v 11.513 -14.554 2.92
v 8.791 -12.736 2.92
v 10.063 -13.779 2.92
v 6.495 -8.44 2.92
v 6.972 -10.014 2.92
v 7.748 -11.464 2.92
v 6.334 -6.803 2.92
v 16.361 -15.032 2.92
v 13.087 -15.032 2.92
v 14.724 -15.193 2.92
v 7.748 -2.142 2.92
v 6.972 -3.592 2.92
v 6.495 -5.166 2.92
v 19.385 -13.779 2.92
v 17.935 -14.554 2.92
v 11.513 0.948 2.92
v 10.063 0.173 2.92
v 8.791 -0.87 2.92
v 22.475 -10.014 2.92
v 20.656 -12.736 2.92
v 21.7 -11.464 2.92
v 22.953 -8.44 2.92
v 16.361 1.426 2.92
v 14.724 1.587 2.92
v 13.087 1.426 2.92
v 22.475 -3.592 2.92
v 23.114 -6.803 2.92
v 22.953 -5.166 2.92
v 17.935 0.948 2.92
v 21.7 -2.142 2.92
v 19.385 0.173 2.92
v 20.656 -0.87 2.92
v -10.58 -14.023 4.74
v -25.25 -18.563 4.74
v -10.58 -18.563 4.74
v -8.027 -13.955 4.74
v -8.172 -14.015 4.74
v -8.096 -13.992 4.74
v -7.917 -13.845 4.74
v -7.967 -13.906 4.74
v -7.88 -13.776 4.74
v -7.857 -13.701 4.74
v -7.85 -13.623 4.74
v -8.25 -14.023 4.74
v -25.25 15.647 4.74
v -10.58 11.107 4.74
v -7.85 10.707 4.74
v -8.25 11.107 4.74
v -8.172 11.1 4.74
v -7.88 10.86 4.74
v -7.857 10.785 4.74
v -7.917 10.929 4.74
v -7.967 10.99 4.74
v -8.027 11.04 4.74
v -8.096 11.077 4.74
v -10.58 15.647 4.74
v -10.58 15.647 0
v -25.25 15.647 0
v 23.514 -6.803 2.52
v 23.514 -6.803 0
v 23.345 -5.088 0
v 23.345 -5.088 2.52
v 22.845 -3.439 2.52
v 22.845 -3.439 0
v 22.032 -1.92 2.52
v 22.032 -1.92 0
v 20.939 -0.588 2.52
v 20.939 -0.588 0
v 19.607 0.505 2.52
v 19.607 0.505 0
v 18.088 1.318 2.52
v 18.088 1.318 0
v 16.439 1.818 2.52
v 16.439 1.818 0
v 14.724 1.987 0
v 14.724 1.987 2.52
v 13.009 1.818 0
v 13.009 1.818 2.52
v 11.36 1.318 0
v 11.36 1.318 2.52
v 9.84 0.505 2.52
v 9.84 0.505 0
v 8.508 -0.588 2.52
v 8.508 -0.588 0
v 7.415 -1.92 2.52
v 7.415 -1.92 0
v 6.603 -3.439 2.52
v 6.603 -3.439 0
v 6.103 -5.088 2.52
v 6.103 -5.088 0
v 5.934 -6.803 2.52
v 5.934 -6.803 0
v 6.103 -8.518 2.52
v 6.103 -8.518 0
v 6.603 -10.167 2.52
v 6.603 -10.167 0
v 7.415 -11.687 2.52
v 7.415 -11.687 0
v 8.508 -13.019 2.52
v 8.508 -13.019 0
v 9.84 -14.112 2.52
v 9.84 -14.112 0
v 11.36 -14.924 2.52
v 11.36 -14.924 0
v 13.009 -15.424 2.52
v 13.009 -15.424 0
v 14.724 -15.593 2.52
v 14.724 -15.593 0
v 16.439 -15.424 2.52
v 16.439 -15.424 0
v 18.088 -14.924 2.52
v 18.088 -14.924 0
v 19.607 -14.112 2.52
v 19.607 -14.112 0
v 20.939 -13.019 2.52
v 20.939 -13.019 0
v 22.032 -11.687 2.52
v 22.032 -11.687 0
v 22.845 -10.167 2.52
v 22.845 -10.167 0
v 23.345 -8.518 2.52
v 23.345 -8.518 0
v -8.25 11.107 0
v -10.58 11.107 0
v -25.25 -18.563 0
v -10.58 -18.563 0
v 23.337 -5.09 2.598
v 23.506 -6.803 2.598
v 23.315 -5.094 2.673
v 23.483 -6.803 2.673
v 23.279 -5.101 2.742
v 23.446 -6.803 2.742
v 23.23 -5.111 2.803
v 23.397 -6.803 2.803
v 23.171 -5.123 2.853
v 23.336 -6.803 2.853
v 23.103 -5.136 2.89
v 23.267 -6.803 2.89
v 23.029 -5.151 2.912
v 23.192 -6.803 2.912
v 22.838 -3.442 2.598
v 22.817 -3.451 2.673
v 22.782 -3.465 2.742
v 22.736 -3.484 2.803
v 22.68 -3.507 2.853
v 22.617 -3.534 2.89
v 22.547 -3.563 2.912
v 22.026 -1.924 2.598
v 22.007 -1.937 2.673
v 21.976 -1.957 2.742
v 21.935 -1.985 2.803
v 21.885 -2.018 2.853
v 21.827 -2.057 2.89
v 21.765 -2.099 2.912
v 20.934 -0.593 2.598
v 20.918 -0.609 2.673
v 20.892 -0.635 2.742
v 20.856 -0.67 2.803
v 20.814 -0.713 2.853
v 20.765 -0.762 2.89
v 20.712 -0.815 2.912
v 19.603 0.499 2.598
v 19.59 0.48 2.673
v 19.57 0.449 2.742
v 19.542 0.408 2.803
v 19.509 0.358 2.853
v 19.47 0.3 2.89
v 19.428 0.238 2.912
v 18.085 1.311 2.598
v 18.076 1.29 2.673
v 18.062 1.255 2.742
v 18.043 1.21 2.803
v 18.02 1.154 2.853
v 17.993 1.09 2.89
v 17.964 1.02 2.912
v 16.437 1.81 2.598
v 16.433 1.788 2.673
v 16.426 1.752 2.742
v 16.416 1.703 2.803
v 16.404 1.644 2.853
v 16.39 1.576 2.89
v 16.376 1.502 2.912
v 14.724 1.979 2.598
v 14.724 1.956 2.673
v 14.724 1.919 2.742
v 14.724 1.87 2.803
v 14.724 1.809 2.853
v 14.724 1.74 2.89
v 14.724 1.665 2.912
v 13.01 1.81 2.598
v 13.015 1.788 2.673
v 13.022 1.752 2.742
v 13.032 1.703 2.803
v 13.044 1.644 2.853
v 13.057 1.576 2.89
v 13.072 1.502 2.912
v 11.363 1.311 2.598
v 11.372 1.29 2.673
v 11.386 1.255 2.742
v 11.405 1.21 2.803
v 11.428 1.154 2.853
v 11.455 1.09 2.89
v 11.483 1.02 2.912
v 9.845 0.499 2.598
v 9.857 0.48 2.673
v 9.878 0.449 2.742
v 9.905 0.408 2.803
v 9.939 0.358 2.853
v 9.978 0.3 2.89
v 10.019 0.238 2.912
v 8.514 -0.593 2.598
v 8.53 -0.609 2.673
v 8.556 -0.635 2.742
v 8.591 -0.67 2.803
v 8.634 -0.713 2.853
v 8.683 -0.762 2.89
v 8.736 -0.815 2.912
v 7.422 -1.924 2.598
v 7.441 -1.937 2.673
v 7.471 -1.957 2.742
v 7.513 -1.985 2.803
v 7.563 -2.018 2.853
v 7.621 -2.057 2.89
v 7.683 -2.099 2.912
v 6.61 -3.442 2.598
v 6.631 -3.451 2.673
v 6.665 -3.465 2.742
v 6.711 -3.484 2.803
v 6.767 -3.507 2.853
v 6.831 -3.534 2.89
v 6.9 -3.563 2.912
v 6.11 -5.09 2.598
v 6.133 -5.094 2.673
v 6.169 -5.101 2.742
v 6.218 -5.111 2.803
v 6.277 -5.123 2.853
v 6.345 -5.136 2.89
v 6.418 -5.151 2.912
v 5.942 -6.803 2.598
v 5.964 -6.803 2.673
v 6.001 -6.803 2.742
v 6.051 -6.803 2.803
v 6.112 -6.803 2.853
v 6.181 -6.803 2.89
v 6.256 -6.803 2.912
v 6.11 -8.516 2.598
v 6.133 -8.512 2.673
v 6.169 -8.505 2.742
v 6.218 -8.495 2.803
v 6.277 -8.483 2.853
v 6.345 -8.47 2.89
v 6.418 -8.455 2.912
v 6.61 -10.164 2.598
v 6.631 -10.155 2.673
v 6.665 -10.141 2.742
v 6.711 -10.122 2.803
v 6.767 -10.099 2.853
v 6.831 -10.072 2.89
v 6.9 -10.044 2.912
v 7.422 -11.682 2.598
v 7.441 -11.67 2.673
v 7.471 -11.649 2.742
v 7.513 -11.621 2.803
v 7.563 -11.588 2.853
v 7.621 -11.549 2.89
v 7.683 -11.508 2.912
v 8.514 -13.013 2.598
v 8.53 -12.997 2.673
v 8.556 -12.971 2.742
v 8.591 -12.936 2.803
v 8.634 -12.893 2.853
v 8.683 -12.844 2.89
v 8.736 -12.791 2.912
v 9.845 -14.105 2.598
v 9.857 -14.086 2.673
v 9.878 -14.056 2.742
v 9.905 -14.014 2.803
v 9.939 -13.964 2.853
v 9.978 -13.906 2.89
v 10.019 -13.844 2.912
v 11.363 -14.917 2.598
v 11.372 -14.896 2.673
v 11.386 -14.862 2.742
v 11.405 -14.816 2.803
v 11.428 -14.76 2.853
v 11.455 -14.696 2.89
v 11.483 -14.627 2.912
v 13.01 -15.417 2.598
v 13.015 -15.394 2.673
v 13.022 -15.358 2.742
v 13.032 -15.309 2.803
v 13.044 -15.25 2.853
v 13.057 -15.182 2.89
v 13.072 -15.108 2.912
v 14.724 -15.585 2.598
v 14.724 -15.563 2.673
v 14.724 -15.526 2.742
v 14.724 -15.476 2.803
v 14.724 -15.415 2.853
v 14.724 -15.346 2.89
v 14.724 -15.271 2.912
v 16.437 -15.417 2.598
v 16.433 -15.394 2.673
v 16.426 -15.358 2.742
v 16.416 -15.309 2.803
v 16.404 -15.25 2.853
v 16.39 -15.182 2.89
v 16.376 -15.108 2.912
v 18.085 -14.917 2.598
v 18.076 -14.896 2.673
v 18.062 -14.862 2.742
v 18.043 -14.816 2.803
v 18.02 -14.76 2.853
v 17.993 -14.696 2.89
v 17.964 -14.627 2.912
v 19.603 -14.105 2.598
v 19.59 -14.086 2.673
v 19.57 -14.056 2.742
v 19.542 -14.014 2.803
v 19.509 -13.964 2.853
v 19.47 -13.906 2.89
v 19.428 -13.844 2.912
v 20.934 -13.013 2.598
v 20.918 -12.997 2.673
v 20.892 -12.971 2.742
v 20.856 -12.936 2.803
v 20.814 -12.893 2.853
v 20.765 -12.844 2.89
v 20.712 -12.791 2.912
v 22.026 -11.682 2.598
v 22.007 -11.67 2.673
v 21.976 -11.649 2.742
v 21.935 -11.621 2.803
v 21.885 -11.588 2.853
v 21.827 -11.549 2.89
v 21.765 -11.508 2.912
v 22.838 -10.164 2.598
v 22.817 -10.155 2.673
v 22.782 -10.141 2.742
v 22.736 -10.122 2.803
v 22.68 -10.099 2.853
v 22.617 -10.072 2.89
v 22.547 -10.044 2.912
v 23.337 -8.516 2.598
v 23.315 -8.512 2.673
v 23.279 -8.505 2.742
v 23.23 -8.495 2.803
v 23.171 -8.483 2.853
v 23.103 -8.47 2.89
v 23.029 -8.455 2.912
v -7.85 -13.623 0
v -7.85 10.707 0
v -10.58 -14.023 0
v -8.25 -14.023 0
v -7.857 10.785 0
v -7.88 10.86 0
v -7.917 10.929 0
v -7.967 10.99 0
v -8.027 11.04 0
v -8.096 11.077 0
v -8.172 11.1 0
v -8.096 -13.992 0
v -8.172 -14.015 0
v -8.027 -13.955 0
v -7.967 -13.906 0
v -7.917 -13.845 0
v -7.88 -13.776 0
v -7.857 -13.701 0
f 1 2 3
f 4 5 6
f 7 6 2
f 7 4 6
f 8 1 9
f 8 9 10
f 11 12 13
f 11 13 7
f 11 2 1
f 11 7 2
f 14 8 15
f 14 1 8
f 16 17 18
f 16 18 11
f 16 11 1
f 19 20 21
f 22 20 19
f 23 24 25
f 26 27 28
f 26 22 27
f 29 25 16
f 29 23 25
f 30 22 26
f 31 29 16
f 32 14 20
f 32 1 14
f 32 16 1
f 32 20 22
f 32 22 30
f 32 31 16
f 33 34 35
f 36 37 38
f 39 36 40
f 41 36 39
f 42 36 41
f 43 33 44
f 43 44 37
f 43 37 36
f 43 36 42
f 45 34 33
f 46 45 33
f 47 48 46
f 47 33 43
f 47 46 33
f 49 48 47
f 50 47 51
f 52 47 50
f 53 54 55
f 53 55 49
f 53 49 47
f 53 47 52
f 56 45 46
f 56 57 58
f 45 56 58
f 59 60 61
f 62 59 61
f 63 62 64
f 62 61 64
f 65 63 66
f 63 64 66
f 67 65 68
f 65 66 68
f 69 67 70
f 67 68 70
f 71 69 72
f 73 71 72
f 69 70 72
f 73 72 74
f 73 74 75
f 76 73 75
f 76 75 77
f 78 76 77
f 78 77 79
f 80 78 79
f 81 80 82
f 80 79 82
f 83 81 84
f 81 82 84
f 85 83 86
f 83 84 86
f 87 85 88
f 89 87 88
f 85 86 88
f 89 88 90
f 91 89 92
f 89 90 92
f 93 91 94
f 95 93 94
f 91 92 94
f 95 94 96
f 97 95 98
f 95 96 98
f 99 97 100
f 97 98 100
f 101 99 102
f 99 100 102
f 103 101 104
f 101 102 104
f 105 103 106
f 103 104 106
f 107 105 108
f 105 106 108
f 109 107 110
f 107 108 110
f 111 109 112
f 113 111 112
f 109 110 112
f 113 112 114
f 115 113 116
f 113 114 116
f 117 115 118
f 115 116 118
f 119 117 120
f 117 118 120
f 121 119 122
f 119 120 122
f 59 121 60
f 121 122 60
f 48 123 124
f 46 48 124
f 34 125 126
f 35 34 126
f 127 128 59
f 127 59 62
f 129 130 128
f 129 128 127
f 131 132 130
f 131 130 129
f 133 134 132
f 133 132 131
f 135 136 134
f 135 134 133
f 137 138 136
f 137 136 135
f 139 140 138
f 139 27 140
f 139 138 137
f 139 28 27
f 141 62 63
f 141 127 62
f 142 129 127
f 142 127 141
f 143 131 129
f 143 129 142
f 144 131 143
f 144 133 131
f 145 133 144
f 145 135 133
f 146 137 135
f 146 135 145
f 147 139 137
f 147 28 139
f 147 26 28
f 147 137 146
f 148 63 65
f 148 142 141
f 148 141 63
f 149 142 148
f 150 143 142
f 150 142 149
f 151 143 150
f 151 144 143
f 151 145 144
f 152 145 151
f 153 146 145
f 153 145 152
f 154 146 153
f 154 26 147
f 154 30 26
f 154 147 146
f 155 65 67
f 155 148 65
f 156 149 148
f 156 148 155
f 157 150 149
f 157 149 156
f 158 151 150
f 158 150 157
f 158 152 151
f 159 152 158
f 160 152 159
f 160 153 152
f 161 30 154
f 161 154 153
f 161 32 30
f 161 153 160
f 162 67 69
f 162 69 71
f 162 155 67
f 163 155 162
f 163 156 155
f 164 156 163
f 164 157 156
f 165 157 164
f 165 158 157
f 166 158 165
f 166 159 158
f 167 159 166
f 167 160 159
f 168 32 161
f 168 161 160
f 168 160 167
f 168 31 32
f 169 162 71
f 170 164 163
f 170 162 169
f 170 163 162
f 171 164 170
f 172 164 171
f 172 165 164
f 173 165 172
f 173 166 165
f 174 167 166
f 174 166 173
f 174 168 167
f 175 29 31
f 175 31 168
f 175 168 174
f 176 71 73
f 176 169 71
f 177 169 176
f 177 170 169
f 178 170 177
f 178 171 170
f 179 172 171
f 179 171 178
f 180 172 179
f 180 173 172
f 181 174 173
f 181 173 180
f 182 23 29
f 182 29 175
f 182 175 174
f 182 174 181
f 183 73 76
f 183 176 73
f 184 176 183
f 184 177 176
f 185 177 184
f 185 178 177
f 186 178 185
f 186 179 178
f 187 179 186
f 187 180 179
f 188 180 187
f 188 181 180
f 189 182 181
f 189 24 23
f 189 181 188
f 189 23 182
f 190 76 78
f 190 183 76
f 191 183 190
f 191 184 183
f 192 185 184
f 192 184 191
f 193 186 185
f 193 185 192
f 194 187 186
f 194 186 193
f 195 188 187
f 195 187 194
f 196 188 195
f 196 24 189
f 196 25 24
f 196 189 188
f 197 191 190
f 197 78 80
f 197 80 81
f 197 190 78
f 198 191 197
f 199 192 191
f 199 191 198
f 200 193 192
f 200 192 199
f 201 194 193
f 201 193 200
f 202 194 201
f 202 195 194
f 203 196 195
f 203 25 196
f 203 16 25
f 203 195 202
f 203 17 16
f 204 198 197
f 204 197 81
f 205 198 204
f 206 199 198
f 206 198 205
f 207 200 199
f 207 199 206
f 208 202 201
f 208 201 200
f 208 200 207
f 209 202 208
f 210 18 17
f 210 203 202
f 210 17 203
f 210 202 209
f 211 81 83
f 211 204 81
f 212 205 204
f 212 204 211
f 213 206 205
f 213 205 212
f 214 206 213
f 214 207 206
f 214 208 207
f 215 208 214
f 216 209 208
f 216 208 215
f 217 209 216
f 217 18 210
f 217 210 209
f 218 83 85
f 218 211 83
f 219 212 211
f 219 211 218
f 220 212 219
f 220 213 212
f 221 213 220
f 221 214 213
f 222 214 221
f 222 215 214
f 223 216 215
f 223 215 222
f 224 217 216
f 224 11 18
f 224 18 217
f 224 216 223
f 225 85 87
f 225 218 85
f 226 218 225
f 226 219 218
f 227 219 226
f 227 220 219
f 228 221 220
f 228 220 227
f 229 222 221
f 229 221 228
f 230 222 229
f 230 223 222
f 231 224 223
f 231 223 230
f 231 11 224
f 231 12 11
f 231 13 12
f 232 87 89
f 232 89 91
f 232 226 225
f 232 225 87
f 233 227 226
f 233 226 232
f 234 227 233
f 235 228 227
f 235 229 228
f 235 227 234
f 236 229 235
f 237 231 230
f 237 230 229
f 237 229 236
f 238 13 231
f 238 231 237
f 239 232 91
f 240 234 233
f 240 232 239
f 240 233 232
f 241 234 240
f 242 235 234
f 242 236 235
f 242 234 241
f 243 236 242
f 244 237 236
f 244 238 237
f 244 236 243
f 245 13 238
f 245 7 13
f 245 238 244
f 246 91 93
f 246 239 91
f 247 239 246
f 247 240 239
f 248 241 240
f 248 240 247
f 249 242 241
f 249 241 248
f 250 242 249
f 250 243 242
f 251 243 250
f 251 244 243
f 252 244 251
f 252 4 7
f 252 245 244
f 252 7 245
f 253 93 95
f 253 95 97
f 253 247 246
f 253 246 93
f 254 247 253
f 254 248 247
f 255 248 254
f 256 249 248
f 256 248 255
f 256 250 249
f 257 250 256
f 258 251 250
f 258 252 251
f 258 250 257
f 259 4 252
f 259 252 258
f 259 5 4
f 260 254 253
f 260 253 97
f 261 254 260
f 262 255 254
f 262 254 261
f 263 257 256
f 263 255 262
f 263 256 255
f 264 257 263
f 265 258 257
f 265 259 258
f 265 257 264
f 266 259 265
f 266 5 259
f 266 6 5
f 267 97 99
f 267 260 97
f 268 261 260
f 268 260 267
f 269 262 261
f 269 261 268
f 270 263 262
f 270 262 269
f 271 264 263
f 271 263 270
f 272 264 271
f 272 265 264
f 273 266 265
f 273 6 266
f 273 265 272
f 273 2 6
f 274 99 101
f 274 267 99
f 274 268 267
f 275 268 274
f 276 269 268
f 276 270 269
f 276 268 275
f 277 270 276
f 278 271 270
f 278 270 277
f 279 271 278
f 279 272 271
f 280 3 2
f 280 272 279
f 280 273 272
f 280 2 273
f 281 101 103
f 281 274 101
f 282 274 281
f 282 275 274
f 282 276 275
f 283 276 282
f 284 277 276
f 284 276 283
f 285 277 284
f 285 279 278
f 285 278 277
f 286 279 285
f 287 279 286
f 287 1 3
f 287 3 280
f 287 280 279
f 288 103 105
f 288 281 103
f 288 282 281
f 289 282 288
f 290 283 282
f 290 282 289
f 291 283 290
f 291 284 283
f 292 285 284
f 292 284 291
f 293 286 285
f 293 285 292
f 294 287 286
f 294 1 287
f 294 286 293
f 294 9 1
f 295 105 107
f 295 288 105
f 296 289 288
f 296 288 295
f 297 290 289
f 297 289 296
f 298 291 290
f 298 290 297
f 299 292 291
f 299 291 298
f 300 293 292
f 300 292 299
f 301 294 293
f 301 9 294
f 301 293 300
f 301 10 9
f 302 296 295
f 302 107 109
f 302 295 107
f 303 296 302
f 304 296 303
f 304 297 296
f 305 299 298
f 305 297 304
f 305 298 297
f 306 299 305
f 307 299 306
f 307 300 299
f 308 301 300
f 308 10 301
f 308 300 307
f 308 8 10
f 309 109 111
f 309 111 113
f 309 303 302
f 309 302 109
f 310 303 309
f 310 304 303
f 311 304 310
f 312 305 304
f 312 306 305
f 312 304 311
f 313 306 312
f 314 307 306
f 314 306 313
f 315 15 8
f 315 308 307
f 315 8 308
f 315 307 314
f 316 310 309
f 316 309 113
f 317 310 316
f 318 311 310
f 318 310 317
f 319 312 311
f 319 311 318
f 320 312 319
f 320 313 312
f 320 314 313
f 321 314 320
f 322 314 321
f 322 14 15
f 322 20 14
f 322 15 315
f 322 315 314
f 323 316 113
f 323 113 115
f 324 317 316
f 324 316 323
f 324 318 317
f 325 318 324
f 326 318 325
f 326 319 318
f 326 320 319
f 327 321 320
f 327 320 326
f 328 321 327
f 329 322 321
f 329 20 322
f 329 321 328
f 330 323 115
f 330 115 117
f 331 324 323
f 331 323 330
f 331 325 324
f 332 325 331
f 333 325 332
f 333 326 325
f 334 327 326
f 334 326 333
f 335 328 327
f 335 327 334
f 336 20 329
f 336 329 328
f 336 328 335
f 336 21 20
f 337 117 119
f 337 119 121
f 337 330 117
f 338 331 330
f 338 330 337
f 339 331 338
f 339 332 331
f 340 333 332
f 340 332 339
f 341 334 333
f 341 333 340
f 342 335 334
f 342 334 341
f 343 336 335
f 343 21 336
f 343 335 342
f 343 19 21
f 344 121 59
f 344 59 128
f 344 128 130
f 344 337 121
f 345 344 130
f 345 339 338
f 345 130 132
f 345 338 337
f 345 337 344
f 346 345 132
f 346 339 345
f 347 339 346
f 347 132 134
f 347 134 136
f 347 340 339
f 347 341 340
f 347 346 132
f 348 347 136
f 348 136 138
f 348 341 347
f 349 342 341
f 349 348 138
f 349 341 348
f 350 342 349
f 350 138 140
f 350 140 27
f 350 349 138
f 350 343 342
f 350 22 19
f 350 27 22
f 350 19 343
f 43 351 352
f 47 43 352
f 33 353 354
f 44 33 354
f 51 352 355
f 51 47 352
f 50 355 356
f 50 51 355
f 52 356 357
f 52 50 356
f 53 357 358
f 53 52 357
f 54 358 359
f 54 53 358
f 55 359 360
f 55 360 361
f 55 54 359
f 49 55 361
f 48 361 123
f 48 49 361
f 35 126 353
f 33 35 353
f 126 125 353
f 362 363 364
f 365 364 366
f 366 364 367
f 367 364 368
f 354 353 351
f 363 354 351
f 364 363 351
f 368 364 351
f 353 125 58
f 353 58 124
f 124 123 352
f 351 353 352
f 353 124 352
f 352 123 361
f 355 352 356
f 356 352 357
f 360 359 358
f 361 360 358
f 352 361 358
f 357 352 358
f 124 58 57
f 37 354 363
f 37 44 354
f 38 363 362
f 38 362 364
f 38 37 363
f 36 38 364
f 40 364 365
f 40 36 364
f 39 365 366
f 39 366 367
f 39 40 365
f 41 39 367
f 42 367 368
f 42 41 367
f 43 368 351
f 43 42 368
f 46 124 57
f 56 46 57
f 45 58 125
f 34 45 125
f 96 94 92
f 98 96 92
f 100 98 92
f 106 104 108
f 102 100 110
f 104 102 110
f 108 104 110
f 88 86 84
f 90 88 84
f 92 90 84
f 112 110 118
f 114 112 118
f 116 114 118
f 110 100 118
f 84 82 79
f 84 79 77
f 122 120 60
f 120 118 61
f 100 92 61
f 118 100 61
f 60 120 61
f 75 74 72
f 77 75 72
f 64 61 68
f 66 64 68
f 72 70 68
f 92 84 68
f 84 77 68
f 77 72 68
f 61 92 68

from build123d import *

# Parameters (mm, degrees)
F1_DEPTH = 4.74
F0_R     = 8.79
F2_DEPTH = 2.92
F3_R     = 0.4
F3_2_R   = 0.4


with BuildPart() as f1:
    # F0 (on Top) → F1 (new body)
    with BuildSketch(Plane.XY):
        Polygon((-10.57955, 15.6472), (-25.24955, 15.6472), (-25.24955, -18.5628), (-10.57955, -18.5628), (-10.57955, -14.0228), (-7.84955, -14.0228), (-7.84955, 11.1072), (-10.57955, 11.1072), align=None)
    extrude(amount=F1_DEPTH)

    # F3
    f3_edges = [f1.edges().sort_by_distance(p)[0] for p in [
        (-7.84955, -14.0228, 2.37),
        (-7.84955, 11.1072, 2.37),
    ]]
    fillet(f3_edges, radius=F3_R)


with BuildPart() as f2:
    # F0 (on Top) → F2 (new body)
    with BuildSketch(Plane.XY):
        with Locations((14.723821, -6.803122)):
            Circle(F0_R)
    extrude(amount=F2_DEPTH)

    # F3#2
    f3_2_edges = [f2.edges().sort_by_distance(p)[0] for p in [
        (5.933821, -6.803122, 2.92),
    ]]
    fillet(f3_2_edges, radius=F3_2_R)


solid = Compound([f1.part, f2.part])
